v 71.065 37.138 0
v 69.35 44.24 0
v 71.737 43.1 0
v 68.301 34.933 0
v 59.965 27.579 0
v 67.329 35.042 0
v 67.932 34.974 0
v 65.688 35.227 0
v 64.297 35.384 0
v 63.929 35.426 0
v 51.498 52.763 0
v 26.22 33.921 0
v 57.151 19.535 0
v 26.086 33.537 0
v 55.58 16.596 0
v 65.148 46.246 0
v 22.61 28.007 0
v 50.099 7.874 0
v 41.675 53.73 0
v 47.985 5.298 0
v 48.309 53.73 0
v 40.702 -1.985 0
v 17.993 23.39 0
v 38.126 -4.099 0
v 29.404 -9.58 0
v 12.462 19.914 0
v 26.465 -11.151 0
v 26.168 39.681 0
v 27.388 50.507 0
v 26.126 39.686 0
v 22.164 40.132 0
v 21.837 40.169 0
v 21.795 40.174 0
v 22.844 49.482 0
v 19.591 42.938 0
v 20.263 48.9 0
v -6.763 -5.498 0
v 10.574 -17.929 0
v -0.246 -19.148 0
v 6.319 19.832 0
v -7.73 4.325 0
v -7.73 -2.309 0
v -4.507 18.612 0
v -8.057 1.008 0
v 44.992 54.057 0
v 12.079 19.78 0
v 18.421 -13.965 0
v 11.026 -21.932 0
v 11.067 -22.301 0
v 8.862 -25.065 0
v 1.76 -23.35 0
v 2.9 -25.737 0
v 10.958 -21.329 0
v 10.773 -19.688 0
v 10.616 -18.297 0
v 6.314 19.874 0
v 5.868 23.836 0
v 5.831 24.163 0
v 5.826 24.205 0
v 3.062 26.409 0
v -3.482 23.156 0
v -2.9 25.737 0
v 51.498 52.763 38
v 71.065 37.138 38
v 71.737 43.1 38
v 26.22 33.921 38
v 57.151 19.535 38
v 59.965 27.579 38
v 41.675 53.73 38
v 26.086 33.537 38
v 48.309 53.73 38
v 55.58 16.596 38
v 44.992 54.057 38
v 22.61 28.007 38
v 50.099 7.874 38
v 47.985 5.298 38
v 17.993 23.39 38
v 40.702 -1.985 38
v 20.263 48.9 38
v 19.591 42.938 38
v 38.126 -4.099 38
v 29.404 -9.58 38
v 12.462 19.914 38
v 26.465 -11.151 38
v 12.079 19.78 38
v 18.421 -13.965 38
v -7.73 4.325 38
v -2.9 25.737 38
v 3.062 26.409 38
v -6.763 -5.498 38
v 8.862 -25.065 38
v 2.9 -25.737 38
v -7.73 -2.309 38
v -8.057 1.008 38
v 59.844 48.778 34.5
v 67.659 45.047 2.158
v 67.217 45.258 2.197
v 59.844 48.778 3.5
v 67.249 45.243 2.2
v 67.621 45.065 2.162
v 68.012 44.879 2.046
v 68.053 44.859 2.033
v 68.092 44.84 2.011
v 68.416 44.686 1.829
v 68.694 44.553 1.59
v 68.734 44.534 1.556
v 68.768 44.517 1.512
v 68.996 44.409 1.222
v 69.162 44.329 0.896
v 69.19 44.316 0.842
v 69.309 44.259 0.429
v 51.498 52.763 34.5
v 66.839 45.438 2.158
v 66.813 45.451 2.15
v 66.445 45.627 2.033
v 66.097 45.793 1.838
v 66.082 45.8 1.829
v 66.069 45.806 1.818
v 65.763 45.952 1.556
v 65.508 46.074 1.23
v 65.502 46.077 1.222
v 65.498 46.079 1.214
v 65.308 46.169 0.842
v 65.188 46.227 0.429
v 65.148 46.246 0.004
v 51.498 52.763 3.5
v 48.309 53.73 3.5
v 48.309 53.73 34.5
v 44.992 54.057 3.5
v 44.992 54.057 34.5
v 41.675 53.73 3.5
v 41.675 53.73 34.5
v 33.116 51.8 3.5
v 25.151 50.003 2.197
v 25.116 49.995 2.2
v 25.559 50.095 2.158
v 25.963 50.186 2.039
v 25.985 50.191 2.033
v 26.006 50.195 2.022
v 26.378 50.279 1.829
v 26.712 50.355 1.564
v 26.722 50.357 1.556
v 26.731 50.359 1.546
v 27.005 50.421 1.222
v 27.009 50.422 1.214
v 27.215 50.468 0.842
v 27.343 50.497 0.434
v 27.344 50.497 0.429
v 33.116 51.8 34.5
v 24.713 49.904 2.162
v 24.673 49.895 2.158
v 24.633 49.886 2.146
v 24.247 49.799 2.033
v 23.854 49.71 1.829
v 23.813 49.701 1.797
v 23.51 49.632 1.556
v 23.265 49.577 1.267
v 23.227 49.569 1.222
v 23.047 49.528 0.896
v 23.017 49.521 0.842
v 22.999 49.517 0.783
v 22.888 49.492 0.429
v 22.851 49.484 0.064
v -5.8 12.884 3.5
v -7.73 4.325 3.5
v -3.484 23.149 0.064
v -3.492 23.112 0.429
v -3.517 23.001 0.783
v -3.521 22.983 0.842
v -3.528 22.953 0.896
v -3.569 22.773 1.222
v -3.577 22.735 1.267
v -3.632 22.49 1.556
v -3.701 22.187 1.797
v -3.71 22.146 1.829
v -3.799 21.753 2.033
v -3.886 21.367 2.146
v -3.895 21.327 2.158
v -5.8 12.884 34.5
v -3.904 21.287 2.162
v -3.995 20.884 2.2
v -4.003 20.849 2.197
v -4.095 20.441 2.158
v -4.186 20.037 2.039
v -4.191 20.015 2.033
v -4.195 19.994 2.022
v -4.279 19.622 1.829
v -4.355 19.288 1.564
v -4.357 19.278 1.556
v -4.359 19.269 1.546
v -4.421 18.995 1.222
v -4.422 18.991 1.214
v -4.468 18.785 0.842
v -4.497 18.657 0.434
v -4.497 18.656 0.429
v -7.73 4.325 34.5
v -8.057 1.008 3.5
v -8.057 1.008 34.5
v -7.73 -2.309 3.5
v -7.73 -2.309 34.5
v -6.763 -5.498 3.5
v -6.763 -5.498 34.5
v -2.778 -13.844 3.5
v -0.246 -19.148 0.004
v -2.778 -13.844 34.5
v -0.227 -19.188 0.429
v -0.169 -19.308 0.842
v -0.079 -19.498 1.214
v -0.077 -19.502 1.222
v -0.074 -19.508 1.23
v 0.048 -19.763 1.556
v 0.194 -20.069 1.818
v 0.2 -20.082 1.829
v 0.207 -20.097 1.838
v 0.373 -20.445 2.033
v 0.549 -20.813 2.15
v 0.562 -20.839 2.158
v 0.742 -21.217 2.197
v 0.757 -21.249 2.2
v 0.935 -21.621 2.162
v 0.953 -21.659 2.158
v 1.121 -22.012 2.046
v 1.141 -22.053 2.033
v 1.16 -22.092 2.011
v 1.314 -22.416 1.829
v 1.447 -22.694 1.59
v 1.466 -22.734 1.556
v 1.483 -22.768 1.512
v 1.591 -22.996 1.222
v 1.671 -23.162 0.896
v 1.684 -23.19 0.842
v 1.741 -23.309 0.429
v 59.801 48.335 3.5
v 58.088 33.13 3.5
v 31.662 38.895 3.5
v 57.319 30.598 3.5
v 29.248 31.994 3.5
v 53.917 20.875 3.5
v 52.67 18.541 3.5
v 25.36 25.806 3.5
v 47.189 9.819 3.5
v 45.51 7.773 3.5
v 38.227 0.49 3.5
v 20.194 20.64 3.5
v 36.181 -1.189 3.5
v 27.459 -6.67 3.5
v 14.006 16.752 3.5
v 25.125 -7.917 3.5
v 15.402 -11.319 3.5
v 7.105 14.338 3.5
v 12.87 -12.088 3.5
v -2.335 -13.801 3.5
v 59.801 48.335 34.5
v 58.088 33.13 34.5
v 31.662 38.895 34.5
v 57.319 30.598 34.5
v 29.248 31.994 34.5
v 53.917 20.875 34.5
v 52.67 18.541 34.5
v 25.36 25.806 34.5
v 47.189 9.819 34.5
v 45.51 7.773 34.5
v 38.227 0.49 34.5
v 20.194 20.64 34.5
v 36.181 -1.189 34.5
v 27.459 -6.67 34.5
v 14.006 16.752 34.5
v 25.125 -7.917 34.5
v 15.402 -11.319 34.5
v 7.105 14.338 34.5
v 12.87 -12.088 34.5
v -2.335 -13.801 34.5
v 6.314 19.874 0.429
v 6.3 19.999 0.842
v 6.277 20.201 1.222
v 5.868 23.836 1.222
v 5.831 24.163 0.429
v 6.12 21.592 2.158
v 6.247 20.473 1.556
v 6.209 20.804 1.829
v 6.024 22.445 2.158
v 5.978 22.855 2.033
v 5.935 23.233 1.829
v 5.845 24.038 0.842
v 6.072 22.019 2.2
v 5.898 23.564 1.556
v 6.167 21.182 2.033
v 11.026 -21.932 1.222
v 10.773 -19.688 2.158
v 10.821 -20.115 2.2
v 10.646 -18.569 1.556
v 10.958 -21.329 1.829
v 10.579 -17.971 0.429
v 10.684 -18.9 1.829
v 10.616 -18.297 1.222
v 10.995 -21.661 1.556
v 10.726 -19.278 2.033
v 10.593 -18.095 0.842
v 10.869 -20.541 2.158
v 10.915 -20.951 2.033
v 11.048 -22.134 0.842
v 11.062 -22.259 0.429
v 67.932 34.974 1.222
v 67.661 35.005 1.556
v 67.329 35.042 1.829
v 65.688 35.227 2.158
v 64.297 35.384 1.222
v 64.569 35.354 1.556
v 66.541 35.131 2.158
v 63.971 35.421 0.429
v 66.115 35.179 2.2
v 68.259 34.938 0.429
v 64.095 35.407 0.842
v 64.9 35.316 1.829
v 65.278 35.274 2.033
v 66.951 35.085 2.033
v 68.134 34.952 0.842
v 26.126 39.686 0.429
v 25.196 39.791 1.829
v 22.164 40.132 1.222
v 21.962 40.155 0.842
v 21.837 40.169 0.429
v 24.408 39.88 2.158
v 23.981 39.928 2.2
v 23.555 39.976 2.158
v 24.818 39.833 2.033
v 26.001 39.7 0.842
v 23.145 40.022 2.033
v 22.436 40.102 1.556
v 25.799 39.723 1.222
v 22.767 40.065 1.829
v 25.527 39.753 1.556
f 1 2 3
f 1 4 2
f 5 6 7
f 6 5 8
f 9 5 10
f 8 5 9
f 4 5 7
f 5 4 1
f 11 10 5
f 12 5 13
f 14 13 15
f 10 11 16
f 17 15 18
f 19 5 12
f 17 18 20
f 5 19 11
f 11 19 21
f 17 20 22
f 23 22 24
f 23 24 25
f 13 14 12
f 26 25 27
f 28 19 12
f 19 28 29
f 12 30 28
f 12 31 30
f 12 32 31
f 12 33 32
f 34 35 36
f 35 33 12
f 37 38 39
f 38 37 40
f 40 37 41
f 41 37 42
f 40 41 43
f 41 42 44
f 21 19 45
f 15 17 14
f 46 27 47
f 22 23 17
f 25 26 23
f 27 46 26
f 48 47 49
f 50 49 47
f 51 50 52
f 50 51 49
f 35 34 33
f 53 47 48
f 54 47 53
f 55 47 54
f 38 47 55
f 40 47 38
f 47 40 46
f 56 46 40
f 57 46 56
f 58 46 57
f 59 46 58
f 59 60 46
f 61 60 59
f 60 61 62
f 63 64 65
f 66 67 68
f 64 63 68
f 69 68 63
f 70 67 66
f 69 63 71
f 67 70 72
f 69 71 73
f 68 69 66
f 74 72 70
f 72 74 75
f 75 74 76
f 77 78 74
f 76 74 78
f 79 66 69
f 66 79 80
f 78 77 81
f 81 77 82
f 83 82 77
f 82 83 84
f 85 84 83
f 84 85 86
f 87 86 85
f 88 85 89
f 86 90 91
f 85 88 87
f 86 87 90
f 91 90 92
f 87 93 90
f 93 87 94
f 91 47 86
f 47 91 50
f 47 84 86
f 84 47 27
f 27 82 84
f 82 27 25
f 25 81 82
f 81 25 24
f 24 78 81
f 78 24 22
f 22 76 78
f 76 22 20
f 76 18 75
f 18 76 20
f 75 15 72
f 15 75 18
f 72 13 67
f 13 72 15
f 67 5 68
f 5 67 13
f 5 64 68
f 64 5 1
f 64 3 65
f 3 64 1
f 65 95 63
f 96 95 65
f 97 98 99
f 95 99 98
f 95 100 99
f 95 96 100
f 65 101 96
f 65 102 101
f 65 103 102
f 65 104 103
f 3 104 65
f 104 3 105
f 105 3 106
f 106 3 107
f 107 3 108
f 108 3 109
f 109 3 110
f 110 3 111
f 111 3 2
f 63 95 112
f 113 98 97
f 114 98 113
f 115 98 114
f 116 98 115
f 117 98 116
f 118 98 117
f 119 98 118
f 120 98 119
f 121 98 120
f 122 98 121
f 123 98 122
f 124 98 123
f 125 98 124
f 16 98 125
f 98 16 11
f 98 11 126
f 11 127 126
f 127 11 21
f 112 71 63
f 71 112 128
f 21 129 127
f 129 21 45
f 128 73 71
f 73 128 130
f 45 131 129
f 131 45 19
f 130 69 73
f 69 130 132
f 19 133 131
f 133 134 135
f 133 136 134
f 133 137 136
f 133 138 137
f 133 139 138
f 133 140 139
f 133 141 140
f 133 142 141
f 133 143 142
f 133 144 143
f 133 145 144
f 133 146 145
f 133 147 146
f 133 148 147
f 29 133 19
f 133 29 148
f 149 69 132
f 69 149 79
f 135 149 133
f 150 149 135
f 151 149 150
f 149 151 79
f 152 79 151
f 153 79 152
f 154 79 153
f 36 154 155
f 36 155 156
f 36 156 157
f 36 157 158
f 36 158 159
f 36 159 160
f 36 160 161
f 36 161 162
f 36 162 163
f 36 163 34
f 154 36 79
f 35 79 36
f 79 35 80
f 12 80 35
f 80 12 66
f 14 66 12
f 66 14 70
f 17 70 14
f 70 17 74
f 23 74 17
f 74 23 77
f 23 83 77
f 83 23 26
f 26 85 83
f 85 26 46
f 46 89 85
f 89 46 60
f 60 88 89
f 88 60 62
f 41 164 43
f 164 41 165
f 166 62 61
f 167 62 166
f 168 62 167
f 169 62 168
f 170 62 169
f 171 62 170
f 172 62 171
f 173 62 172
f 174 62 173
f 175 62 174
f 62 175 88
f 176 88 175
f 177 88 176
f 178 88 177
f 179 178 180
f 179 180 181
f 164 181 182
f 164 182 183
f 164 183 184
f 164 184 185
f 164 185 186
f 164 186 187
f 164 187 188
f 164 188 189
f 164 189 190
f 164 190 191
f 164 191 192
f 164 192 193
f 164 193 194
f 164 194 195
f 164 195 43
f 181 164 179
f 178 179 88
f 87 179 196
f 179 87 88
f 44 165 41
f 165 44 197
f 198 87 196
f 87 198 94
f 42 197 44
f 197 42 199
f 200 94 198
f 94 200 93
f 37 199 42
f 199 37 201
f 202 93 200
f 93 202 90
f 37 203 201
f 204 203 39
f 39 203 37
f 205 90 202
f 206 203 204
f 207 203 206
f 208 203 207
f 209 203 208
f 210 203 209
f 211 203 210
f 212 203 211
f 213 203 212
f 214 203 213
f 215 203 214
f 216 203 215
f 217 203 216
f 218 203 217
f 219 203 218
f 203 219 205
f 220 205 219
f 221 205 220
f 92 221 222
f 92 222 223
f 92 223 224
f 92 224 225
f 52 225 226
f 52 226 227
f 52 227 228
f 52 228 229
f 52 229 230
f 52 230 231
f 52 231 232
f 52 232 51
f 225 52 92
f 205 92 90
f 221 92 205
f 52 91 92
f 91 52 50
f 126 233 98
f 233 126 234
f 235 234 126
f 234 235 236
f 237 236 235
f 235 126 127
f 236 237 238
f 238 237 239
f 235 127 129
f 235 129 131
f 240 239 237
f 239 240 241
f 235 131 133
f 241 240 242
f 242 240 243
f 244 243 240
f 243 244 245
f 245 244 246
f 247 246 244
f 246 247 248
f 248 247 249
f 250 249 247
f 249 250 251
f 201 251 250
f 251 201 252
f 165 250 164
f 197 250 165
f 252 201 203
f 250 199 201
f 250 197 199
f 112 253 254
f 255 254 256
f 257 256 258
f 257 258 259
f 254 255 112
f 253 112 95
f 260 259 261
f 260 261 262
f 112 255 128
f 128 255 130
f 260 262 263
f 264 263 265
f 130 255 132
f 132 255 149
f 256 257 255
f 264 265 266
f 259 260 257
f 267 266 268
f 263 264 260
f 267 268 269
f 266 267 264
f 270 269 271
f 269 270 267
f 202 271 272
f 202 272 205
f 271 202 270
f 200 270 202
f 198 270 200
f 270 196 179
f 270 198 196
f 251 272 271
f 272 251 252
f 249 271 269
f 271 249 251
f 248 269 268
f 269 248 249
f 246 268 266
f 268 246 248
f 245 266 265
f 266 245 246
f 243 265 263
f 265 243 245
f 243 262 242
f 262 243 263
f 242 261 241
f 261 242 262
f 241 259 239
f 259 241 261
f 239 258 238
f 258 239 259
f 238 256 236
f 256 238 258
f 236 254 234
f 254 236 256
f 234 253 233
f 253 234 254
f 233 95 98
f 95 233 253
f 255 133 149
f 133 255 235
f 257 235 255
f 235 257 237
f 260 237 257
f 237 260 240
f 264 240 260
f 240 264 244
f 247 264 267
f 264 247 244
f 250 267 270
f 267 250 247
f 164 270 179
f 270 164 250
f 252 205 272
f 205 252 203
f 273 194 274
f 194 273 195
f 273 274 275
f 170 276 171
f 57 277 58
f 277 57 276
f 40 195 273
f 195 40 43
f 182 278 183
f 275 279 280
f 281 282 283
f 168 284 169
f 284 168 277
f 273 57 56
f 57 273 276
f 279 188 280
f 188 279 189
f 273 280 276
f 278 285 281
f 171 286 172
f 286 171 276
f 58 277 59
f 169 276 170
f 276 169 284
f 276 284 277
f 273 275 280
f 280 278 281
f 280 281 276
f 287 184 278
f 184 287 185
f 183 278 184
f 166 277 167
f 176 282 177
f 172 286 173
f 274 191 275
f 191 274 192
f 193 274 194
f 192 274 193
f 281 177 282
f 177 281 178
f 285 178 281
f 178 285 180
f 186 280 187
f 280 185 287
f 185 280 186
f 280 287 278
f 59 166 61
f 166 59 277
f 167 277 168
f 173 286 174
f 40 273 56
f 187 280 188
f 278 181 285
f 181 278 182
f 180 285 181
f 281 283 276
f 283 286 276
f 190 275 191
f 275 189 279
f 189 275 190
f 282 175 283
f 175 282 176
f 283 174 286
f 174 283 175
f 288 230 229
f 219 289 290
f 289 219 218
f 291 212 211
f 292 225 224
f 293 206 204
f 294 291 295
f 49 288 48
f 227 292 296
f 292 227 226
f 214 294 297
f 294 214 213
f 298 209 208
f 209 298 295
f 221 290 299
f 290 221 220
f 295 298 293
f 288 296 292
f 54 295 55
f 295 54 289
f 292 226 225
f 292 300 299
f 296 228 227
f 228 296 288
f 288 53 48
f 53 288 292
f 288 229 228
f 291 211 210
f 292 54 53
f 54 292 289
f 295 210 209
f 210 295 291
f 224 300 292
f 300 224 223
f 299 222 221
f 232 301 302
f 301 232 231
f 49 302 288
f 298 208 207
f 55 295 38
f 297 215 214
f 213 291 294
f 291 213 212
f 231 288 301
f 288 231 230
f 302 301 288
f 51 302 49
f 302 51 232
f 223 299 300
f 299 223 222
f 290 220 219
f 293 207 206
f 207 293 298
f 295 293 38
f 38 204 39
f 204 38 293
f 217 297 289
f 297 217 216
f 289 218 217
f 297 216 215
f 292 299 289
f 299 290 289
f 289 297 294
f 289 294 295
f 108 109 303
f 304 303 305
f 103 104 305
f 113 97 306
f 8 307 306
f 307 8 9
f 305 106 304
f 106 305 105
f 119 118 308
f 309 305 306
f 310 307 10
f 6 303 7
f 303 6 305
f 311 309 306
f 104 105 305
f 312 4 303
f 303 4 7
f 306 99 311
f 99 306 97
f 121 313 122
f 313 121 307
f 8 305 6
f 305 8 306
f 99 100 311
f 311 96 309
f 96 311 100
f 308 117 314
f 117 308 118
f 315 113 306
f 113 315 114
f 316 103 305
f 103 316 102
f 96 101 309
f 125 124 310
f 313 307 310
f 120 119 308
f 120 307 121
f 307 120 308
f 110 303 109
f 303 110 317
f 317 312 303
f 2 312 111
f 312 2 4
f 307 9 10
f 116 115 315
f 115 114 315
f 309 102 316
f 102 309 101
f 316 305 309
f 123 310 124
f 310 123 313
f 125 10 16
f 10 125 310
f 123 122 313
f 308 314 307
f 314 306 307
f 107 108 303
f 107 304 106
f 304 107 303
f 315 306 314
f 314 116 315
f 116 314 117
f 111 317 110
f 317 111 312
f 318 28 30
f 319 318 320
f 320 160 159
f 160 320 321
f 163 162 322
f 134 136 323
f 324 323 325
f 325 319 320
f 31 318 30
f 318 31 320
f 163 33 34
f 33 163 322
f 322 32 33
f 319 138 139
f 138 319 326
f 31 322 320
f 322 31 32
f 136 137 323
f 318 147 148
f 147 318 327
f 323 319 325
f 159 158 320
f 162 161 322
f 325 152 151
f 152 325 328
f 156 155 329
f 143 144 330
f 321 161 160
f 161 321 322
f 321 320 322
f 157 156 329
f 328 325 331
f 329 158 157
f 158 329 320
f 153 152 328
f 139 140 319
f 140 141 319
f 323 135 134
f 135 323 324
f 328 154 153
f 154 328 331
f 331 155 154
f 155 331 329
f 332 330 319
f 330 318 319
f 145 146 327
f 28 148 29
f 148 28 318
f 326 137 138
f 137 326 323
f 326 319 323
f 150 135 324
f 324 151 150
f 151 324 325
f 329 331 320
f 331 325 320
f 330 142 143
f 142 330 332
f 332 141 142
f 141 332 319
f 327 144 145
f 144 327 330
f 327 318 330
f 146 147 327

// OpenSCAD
$fn = 32;

// ----------------------------------------------------------------------
// Air duct: 34 mm duct, 3.5 mm wall, 38 mm across
// ----------------------------------------------------------------------

// --- parameters (mm) ---
duct_r = 17;              // duct core radius
duct_d = 34;              // duct core diameter
wall = 3.5;               // duct wall thickness
height = 38;              // duct width (extrusion height)
port_r = 25.9;            // port flange half width
port_d = 51.8;            // port flange width
port_t = 6;               // port flange thickness
bolt_d = 4.4;             // port bolt holes
bolt_offset = 21.2;       // bolt hole offset from the port axis

difference() {
  /* outer hull chain: tube with a flat flange plate at every port */
  linear_extrude(height = 38) {
    hull() {
      polygon([[2.9, -25.737], [-2.9, 25.737], [3.062, 26.409], [8.862, -25.065]]);
      translate([8.943, 1.008]) circle(r = 17);
    }
    hull() {
      translate([8.943, 1.008]) circle(r = 17);
      translate([10.236, 1.153]) circle(r = 17);
    }
    hull() {
      translate([10.236, 1.153]) circle(r = 17);
      translate([19.959, 4.555]) circle(r = 17);
    }
    hull() {
      translate([19.959, 4.555]) circle(r = 17);
      translate([28.681, 10.036]) circle(r = 17);
    }
    hull() {
      translate([28.681, 10.036]) circle(r = 17);
      translate([35.964, 17.319]) circle(r = 17);
    }
    hull() {
      translate([35.964, 17.319]) circle(r = 17);
      translate([41.445, 26.041]) circle(r = 17);
    }
    hull() {
      translate([41.445, 26.041]) circle(r = 17);
      translate([44.847, 35.764]) circle(r = 17);
    }
    hull() {
      translate([44.847, 35.764]) circle(r = 17);
      translate([44.992, 37.057]) circle(r = 17);
    }
    hull() {
      translate([44.992, 37.057]) circle(r = 17);
      polygon([[20.263, 48.9], [71.737, 43.1], [71.065, 37.138], [19.591, 42.938]]);
    }
  }
  /* air passage: the same chain inset by the wall, 5 mm proud of the ports */
  translate([0, 0, 3.5]) linear_extrude(height = 31) {
    hull() {
      translate([-4.969, -0.56]) circle(r = 13.5);
      translate([10.236, 1.153]) circle(r = 13.5);
    }
    hull() {
      translate([10.236, 1.153]) circle(r = 13.5);
      translate([19.959, 4.555]) circle(r = 13.5);
    }
    hull() {
      translate([19.959, 4.555]) circle(r = 13.5);
      translate([28.681, 10.036]) circle(r = 13.5);
    }
    hull() {
      translate([28.681, 10.036]) circle(r = 13.5);
      translate([35.964, 17.319]) circle(r = 13.5);
    }
    hull() {
      translate([35.964, 17.319]) circle(r = 13.5);
      translate([41.445, 26.041]) circle(r = 13.5);
    }
    hull() {
      translate([41.445, 26.041]) circle(r = 13.5);
      translate([44.847, 35.764]) circle(r = 13.5);
    }
    hull() {
      translate([44.847, 35.764]) circle(r = 13.5);
      translate([46.56, 50.969]) circle(r = 13.5);
    }
  }
  translate([0, 0]) rotate([0, 0, -83.57]) translate([-21.2, -2.5]) rotate([-90, 0, 0]) cylinder(h = 11, d = 4.4);
  translate([0, 0]) rotate([0, 0, -83.57]) translate([21.2, -2.5]) rotate([-90, 0, 0]) cylinder(h = 11, d = 4.4);
  translate([46, 46]) rotate([0, 0, 173.57]) translate([-21.2, -2.5]) rotate([-90, 0, 0]) cylinder(h = 11, d = 4.4);
  translate([46, 46]) rotate([0, 0, 173.57]) translate([21.2, -2.5]) rotate([-90, 0, 0]) cylinder(h = 11, d = 4.4);
}
